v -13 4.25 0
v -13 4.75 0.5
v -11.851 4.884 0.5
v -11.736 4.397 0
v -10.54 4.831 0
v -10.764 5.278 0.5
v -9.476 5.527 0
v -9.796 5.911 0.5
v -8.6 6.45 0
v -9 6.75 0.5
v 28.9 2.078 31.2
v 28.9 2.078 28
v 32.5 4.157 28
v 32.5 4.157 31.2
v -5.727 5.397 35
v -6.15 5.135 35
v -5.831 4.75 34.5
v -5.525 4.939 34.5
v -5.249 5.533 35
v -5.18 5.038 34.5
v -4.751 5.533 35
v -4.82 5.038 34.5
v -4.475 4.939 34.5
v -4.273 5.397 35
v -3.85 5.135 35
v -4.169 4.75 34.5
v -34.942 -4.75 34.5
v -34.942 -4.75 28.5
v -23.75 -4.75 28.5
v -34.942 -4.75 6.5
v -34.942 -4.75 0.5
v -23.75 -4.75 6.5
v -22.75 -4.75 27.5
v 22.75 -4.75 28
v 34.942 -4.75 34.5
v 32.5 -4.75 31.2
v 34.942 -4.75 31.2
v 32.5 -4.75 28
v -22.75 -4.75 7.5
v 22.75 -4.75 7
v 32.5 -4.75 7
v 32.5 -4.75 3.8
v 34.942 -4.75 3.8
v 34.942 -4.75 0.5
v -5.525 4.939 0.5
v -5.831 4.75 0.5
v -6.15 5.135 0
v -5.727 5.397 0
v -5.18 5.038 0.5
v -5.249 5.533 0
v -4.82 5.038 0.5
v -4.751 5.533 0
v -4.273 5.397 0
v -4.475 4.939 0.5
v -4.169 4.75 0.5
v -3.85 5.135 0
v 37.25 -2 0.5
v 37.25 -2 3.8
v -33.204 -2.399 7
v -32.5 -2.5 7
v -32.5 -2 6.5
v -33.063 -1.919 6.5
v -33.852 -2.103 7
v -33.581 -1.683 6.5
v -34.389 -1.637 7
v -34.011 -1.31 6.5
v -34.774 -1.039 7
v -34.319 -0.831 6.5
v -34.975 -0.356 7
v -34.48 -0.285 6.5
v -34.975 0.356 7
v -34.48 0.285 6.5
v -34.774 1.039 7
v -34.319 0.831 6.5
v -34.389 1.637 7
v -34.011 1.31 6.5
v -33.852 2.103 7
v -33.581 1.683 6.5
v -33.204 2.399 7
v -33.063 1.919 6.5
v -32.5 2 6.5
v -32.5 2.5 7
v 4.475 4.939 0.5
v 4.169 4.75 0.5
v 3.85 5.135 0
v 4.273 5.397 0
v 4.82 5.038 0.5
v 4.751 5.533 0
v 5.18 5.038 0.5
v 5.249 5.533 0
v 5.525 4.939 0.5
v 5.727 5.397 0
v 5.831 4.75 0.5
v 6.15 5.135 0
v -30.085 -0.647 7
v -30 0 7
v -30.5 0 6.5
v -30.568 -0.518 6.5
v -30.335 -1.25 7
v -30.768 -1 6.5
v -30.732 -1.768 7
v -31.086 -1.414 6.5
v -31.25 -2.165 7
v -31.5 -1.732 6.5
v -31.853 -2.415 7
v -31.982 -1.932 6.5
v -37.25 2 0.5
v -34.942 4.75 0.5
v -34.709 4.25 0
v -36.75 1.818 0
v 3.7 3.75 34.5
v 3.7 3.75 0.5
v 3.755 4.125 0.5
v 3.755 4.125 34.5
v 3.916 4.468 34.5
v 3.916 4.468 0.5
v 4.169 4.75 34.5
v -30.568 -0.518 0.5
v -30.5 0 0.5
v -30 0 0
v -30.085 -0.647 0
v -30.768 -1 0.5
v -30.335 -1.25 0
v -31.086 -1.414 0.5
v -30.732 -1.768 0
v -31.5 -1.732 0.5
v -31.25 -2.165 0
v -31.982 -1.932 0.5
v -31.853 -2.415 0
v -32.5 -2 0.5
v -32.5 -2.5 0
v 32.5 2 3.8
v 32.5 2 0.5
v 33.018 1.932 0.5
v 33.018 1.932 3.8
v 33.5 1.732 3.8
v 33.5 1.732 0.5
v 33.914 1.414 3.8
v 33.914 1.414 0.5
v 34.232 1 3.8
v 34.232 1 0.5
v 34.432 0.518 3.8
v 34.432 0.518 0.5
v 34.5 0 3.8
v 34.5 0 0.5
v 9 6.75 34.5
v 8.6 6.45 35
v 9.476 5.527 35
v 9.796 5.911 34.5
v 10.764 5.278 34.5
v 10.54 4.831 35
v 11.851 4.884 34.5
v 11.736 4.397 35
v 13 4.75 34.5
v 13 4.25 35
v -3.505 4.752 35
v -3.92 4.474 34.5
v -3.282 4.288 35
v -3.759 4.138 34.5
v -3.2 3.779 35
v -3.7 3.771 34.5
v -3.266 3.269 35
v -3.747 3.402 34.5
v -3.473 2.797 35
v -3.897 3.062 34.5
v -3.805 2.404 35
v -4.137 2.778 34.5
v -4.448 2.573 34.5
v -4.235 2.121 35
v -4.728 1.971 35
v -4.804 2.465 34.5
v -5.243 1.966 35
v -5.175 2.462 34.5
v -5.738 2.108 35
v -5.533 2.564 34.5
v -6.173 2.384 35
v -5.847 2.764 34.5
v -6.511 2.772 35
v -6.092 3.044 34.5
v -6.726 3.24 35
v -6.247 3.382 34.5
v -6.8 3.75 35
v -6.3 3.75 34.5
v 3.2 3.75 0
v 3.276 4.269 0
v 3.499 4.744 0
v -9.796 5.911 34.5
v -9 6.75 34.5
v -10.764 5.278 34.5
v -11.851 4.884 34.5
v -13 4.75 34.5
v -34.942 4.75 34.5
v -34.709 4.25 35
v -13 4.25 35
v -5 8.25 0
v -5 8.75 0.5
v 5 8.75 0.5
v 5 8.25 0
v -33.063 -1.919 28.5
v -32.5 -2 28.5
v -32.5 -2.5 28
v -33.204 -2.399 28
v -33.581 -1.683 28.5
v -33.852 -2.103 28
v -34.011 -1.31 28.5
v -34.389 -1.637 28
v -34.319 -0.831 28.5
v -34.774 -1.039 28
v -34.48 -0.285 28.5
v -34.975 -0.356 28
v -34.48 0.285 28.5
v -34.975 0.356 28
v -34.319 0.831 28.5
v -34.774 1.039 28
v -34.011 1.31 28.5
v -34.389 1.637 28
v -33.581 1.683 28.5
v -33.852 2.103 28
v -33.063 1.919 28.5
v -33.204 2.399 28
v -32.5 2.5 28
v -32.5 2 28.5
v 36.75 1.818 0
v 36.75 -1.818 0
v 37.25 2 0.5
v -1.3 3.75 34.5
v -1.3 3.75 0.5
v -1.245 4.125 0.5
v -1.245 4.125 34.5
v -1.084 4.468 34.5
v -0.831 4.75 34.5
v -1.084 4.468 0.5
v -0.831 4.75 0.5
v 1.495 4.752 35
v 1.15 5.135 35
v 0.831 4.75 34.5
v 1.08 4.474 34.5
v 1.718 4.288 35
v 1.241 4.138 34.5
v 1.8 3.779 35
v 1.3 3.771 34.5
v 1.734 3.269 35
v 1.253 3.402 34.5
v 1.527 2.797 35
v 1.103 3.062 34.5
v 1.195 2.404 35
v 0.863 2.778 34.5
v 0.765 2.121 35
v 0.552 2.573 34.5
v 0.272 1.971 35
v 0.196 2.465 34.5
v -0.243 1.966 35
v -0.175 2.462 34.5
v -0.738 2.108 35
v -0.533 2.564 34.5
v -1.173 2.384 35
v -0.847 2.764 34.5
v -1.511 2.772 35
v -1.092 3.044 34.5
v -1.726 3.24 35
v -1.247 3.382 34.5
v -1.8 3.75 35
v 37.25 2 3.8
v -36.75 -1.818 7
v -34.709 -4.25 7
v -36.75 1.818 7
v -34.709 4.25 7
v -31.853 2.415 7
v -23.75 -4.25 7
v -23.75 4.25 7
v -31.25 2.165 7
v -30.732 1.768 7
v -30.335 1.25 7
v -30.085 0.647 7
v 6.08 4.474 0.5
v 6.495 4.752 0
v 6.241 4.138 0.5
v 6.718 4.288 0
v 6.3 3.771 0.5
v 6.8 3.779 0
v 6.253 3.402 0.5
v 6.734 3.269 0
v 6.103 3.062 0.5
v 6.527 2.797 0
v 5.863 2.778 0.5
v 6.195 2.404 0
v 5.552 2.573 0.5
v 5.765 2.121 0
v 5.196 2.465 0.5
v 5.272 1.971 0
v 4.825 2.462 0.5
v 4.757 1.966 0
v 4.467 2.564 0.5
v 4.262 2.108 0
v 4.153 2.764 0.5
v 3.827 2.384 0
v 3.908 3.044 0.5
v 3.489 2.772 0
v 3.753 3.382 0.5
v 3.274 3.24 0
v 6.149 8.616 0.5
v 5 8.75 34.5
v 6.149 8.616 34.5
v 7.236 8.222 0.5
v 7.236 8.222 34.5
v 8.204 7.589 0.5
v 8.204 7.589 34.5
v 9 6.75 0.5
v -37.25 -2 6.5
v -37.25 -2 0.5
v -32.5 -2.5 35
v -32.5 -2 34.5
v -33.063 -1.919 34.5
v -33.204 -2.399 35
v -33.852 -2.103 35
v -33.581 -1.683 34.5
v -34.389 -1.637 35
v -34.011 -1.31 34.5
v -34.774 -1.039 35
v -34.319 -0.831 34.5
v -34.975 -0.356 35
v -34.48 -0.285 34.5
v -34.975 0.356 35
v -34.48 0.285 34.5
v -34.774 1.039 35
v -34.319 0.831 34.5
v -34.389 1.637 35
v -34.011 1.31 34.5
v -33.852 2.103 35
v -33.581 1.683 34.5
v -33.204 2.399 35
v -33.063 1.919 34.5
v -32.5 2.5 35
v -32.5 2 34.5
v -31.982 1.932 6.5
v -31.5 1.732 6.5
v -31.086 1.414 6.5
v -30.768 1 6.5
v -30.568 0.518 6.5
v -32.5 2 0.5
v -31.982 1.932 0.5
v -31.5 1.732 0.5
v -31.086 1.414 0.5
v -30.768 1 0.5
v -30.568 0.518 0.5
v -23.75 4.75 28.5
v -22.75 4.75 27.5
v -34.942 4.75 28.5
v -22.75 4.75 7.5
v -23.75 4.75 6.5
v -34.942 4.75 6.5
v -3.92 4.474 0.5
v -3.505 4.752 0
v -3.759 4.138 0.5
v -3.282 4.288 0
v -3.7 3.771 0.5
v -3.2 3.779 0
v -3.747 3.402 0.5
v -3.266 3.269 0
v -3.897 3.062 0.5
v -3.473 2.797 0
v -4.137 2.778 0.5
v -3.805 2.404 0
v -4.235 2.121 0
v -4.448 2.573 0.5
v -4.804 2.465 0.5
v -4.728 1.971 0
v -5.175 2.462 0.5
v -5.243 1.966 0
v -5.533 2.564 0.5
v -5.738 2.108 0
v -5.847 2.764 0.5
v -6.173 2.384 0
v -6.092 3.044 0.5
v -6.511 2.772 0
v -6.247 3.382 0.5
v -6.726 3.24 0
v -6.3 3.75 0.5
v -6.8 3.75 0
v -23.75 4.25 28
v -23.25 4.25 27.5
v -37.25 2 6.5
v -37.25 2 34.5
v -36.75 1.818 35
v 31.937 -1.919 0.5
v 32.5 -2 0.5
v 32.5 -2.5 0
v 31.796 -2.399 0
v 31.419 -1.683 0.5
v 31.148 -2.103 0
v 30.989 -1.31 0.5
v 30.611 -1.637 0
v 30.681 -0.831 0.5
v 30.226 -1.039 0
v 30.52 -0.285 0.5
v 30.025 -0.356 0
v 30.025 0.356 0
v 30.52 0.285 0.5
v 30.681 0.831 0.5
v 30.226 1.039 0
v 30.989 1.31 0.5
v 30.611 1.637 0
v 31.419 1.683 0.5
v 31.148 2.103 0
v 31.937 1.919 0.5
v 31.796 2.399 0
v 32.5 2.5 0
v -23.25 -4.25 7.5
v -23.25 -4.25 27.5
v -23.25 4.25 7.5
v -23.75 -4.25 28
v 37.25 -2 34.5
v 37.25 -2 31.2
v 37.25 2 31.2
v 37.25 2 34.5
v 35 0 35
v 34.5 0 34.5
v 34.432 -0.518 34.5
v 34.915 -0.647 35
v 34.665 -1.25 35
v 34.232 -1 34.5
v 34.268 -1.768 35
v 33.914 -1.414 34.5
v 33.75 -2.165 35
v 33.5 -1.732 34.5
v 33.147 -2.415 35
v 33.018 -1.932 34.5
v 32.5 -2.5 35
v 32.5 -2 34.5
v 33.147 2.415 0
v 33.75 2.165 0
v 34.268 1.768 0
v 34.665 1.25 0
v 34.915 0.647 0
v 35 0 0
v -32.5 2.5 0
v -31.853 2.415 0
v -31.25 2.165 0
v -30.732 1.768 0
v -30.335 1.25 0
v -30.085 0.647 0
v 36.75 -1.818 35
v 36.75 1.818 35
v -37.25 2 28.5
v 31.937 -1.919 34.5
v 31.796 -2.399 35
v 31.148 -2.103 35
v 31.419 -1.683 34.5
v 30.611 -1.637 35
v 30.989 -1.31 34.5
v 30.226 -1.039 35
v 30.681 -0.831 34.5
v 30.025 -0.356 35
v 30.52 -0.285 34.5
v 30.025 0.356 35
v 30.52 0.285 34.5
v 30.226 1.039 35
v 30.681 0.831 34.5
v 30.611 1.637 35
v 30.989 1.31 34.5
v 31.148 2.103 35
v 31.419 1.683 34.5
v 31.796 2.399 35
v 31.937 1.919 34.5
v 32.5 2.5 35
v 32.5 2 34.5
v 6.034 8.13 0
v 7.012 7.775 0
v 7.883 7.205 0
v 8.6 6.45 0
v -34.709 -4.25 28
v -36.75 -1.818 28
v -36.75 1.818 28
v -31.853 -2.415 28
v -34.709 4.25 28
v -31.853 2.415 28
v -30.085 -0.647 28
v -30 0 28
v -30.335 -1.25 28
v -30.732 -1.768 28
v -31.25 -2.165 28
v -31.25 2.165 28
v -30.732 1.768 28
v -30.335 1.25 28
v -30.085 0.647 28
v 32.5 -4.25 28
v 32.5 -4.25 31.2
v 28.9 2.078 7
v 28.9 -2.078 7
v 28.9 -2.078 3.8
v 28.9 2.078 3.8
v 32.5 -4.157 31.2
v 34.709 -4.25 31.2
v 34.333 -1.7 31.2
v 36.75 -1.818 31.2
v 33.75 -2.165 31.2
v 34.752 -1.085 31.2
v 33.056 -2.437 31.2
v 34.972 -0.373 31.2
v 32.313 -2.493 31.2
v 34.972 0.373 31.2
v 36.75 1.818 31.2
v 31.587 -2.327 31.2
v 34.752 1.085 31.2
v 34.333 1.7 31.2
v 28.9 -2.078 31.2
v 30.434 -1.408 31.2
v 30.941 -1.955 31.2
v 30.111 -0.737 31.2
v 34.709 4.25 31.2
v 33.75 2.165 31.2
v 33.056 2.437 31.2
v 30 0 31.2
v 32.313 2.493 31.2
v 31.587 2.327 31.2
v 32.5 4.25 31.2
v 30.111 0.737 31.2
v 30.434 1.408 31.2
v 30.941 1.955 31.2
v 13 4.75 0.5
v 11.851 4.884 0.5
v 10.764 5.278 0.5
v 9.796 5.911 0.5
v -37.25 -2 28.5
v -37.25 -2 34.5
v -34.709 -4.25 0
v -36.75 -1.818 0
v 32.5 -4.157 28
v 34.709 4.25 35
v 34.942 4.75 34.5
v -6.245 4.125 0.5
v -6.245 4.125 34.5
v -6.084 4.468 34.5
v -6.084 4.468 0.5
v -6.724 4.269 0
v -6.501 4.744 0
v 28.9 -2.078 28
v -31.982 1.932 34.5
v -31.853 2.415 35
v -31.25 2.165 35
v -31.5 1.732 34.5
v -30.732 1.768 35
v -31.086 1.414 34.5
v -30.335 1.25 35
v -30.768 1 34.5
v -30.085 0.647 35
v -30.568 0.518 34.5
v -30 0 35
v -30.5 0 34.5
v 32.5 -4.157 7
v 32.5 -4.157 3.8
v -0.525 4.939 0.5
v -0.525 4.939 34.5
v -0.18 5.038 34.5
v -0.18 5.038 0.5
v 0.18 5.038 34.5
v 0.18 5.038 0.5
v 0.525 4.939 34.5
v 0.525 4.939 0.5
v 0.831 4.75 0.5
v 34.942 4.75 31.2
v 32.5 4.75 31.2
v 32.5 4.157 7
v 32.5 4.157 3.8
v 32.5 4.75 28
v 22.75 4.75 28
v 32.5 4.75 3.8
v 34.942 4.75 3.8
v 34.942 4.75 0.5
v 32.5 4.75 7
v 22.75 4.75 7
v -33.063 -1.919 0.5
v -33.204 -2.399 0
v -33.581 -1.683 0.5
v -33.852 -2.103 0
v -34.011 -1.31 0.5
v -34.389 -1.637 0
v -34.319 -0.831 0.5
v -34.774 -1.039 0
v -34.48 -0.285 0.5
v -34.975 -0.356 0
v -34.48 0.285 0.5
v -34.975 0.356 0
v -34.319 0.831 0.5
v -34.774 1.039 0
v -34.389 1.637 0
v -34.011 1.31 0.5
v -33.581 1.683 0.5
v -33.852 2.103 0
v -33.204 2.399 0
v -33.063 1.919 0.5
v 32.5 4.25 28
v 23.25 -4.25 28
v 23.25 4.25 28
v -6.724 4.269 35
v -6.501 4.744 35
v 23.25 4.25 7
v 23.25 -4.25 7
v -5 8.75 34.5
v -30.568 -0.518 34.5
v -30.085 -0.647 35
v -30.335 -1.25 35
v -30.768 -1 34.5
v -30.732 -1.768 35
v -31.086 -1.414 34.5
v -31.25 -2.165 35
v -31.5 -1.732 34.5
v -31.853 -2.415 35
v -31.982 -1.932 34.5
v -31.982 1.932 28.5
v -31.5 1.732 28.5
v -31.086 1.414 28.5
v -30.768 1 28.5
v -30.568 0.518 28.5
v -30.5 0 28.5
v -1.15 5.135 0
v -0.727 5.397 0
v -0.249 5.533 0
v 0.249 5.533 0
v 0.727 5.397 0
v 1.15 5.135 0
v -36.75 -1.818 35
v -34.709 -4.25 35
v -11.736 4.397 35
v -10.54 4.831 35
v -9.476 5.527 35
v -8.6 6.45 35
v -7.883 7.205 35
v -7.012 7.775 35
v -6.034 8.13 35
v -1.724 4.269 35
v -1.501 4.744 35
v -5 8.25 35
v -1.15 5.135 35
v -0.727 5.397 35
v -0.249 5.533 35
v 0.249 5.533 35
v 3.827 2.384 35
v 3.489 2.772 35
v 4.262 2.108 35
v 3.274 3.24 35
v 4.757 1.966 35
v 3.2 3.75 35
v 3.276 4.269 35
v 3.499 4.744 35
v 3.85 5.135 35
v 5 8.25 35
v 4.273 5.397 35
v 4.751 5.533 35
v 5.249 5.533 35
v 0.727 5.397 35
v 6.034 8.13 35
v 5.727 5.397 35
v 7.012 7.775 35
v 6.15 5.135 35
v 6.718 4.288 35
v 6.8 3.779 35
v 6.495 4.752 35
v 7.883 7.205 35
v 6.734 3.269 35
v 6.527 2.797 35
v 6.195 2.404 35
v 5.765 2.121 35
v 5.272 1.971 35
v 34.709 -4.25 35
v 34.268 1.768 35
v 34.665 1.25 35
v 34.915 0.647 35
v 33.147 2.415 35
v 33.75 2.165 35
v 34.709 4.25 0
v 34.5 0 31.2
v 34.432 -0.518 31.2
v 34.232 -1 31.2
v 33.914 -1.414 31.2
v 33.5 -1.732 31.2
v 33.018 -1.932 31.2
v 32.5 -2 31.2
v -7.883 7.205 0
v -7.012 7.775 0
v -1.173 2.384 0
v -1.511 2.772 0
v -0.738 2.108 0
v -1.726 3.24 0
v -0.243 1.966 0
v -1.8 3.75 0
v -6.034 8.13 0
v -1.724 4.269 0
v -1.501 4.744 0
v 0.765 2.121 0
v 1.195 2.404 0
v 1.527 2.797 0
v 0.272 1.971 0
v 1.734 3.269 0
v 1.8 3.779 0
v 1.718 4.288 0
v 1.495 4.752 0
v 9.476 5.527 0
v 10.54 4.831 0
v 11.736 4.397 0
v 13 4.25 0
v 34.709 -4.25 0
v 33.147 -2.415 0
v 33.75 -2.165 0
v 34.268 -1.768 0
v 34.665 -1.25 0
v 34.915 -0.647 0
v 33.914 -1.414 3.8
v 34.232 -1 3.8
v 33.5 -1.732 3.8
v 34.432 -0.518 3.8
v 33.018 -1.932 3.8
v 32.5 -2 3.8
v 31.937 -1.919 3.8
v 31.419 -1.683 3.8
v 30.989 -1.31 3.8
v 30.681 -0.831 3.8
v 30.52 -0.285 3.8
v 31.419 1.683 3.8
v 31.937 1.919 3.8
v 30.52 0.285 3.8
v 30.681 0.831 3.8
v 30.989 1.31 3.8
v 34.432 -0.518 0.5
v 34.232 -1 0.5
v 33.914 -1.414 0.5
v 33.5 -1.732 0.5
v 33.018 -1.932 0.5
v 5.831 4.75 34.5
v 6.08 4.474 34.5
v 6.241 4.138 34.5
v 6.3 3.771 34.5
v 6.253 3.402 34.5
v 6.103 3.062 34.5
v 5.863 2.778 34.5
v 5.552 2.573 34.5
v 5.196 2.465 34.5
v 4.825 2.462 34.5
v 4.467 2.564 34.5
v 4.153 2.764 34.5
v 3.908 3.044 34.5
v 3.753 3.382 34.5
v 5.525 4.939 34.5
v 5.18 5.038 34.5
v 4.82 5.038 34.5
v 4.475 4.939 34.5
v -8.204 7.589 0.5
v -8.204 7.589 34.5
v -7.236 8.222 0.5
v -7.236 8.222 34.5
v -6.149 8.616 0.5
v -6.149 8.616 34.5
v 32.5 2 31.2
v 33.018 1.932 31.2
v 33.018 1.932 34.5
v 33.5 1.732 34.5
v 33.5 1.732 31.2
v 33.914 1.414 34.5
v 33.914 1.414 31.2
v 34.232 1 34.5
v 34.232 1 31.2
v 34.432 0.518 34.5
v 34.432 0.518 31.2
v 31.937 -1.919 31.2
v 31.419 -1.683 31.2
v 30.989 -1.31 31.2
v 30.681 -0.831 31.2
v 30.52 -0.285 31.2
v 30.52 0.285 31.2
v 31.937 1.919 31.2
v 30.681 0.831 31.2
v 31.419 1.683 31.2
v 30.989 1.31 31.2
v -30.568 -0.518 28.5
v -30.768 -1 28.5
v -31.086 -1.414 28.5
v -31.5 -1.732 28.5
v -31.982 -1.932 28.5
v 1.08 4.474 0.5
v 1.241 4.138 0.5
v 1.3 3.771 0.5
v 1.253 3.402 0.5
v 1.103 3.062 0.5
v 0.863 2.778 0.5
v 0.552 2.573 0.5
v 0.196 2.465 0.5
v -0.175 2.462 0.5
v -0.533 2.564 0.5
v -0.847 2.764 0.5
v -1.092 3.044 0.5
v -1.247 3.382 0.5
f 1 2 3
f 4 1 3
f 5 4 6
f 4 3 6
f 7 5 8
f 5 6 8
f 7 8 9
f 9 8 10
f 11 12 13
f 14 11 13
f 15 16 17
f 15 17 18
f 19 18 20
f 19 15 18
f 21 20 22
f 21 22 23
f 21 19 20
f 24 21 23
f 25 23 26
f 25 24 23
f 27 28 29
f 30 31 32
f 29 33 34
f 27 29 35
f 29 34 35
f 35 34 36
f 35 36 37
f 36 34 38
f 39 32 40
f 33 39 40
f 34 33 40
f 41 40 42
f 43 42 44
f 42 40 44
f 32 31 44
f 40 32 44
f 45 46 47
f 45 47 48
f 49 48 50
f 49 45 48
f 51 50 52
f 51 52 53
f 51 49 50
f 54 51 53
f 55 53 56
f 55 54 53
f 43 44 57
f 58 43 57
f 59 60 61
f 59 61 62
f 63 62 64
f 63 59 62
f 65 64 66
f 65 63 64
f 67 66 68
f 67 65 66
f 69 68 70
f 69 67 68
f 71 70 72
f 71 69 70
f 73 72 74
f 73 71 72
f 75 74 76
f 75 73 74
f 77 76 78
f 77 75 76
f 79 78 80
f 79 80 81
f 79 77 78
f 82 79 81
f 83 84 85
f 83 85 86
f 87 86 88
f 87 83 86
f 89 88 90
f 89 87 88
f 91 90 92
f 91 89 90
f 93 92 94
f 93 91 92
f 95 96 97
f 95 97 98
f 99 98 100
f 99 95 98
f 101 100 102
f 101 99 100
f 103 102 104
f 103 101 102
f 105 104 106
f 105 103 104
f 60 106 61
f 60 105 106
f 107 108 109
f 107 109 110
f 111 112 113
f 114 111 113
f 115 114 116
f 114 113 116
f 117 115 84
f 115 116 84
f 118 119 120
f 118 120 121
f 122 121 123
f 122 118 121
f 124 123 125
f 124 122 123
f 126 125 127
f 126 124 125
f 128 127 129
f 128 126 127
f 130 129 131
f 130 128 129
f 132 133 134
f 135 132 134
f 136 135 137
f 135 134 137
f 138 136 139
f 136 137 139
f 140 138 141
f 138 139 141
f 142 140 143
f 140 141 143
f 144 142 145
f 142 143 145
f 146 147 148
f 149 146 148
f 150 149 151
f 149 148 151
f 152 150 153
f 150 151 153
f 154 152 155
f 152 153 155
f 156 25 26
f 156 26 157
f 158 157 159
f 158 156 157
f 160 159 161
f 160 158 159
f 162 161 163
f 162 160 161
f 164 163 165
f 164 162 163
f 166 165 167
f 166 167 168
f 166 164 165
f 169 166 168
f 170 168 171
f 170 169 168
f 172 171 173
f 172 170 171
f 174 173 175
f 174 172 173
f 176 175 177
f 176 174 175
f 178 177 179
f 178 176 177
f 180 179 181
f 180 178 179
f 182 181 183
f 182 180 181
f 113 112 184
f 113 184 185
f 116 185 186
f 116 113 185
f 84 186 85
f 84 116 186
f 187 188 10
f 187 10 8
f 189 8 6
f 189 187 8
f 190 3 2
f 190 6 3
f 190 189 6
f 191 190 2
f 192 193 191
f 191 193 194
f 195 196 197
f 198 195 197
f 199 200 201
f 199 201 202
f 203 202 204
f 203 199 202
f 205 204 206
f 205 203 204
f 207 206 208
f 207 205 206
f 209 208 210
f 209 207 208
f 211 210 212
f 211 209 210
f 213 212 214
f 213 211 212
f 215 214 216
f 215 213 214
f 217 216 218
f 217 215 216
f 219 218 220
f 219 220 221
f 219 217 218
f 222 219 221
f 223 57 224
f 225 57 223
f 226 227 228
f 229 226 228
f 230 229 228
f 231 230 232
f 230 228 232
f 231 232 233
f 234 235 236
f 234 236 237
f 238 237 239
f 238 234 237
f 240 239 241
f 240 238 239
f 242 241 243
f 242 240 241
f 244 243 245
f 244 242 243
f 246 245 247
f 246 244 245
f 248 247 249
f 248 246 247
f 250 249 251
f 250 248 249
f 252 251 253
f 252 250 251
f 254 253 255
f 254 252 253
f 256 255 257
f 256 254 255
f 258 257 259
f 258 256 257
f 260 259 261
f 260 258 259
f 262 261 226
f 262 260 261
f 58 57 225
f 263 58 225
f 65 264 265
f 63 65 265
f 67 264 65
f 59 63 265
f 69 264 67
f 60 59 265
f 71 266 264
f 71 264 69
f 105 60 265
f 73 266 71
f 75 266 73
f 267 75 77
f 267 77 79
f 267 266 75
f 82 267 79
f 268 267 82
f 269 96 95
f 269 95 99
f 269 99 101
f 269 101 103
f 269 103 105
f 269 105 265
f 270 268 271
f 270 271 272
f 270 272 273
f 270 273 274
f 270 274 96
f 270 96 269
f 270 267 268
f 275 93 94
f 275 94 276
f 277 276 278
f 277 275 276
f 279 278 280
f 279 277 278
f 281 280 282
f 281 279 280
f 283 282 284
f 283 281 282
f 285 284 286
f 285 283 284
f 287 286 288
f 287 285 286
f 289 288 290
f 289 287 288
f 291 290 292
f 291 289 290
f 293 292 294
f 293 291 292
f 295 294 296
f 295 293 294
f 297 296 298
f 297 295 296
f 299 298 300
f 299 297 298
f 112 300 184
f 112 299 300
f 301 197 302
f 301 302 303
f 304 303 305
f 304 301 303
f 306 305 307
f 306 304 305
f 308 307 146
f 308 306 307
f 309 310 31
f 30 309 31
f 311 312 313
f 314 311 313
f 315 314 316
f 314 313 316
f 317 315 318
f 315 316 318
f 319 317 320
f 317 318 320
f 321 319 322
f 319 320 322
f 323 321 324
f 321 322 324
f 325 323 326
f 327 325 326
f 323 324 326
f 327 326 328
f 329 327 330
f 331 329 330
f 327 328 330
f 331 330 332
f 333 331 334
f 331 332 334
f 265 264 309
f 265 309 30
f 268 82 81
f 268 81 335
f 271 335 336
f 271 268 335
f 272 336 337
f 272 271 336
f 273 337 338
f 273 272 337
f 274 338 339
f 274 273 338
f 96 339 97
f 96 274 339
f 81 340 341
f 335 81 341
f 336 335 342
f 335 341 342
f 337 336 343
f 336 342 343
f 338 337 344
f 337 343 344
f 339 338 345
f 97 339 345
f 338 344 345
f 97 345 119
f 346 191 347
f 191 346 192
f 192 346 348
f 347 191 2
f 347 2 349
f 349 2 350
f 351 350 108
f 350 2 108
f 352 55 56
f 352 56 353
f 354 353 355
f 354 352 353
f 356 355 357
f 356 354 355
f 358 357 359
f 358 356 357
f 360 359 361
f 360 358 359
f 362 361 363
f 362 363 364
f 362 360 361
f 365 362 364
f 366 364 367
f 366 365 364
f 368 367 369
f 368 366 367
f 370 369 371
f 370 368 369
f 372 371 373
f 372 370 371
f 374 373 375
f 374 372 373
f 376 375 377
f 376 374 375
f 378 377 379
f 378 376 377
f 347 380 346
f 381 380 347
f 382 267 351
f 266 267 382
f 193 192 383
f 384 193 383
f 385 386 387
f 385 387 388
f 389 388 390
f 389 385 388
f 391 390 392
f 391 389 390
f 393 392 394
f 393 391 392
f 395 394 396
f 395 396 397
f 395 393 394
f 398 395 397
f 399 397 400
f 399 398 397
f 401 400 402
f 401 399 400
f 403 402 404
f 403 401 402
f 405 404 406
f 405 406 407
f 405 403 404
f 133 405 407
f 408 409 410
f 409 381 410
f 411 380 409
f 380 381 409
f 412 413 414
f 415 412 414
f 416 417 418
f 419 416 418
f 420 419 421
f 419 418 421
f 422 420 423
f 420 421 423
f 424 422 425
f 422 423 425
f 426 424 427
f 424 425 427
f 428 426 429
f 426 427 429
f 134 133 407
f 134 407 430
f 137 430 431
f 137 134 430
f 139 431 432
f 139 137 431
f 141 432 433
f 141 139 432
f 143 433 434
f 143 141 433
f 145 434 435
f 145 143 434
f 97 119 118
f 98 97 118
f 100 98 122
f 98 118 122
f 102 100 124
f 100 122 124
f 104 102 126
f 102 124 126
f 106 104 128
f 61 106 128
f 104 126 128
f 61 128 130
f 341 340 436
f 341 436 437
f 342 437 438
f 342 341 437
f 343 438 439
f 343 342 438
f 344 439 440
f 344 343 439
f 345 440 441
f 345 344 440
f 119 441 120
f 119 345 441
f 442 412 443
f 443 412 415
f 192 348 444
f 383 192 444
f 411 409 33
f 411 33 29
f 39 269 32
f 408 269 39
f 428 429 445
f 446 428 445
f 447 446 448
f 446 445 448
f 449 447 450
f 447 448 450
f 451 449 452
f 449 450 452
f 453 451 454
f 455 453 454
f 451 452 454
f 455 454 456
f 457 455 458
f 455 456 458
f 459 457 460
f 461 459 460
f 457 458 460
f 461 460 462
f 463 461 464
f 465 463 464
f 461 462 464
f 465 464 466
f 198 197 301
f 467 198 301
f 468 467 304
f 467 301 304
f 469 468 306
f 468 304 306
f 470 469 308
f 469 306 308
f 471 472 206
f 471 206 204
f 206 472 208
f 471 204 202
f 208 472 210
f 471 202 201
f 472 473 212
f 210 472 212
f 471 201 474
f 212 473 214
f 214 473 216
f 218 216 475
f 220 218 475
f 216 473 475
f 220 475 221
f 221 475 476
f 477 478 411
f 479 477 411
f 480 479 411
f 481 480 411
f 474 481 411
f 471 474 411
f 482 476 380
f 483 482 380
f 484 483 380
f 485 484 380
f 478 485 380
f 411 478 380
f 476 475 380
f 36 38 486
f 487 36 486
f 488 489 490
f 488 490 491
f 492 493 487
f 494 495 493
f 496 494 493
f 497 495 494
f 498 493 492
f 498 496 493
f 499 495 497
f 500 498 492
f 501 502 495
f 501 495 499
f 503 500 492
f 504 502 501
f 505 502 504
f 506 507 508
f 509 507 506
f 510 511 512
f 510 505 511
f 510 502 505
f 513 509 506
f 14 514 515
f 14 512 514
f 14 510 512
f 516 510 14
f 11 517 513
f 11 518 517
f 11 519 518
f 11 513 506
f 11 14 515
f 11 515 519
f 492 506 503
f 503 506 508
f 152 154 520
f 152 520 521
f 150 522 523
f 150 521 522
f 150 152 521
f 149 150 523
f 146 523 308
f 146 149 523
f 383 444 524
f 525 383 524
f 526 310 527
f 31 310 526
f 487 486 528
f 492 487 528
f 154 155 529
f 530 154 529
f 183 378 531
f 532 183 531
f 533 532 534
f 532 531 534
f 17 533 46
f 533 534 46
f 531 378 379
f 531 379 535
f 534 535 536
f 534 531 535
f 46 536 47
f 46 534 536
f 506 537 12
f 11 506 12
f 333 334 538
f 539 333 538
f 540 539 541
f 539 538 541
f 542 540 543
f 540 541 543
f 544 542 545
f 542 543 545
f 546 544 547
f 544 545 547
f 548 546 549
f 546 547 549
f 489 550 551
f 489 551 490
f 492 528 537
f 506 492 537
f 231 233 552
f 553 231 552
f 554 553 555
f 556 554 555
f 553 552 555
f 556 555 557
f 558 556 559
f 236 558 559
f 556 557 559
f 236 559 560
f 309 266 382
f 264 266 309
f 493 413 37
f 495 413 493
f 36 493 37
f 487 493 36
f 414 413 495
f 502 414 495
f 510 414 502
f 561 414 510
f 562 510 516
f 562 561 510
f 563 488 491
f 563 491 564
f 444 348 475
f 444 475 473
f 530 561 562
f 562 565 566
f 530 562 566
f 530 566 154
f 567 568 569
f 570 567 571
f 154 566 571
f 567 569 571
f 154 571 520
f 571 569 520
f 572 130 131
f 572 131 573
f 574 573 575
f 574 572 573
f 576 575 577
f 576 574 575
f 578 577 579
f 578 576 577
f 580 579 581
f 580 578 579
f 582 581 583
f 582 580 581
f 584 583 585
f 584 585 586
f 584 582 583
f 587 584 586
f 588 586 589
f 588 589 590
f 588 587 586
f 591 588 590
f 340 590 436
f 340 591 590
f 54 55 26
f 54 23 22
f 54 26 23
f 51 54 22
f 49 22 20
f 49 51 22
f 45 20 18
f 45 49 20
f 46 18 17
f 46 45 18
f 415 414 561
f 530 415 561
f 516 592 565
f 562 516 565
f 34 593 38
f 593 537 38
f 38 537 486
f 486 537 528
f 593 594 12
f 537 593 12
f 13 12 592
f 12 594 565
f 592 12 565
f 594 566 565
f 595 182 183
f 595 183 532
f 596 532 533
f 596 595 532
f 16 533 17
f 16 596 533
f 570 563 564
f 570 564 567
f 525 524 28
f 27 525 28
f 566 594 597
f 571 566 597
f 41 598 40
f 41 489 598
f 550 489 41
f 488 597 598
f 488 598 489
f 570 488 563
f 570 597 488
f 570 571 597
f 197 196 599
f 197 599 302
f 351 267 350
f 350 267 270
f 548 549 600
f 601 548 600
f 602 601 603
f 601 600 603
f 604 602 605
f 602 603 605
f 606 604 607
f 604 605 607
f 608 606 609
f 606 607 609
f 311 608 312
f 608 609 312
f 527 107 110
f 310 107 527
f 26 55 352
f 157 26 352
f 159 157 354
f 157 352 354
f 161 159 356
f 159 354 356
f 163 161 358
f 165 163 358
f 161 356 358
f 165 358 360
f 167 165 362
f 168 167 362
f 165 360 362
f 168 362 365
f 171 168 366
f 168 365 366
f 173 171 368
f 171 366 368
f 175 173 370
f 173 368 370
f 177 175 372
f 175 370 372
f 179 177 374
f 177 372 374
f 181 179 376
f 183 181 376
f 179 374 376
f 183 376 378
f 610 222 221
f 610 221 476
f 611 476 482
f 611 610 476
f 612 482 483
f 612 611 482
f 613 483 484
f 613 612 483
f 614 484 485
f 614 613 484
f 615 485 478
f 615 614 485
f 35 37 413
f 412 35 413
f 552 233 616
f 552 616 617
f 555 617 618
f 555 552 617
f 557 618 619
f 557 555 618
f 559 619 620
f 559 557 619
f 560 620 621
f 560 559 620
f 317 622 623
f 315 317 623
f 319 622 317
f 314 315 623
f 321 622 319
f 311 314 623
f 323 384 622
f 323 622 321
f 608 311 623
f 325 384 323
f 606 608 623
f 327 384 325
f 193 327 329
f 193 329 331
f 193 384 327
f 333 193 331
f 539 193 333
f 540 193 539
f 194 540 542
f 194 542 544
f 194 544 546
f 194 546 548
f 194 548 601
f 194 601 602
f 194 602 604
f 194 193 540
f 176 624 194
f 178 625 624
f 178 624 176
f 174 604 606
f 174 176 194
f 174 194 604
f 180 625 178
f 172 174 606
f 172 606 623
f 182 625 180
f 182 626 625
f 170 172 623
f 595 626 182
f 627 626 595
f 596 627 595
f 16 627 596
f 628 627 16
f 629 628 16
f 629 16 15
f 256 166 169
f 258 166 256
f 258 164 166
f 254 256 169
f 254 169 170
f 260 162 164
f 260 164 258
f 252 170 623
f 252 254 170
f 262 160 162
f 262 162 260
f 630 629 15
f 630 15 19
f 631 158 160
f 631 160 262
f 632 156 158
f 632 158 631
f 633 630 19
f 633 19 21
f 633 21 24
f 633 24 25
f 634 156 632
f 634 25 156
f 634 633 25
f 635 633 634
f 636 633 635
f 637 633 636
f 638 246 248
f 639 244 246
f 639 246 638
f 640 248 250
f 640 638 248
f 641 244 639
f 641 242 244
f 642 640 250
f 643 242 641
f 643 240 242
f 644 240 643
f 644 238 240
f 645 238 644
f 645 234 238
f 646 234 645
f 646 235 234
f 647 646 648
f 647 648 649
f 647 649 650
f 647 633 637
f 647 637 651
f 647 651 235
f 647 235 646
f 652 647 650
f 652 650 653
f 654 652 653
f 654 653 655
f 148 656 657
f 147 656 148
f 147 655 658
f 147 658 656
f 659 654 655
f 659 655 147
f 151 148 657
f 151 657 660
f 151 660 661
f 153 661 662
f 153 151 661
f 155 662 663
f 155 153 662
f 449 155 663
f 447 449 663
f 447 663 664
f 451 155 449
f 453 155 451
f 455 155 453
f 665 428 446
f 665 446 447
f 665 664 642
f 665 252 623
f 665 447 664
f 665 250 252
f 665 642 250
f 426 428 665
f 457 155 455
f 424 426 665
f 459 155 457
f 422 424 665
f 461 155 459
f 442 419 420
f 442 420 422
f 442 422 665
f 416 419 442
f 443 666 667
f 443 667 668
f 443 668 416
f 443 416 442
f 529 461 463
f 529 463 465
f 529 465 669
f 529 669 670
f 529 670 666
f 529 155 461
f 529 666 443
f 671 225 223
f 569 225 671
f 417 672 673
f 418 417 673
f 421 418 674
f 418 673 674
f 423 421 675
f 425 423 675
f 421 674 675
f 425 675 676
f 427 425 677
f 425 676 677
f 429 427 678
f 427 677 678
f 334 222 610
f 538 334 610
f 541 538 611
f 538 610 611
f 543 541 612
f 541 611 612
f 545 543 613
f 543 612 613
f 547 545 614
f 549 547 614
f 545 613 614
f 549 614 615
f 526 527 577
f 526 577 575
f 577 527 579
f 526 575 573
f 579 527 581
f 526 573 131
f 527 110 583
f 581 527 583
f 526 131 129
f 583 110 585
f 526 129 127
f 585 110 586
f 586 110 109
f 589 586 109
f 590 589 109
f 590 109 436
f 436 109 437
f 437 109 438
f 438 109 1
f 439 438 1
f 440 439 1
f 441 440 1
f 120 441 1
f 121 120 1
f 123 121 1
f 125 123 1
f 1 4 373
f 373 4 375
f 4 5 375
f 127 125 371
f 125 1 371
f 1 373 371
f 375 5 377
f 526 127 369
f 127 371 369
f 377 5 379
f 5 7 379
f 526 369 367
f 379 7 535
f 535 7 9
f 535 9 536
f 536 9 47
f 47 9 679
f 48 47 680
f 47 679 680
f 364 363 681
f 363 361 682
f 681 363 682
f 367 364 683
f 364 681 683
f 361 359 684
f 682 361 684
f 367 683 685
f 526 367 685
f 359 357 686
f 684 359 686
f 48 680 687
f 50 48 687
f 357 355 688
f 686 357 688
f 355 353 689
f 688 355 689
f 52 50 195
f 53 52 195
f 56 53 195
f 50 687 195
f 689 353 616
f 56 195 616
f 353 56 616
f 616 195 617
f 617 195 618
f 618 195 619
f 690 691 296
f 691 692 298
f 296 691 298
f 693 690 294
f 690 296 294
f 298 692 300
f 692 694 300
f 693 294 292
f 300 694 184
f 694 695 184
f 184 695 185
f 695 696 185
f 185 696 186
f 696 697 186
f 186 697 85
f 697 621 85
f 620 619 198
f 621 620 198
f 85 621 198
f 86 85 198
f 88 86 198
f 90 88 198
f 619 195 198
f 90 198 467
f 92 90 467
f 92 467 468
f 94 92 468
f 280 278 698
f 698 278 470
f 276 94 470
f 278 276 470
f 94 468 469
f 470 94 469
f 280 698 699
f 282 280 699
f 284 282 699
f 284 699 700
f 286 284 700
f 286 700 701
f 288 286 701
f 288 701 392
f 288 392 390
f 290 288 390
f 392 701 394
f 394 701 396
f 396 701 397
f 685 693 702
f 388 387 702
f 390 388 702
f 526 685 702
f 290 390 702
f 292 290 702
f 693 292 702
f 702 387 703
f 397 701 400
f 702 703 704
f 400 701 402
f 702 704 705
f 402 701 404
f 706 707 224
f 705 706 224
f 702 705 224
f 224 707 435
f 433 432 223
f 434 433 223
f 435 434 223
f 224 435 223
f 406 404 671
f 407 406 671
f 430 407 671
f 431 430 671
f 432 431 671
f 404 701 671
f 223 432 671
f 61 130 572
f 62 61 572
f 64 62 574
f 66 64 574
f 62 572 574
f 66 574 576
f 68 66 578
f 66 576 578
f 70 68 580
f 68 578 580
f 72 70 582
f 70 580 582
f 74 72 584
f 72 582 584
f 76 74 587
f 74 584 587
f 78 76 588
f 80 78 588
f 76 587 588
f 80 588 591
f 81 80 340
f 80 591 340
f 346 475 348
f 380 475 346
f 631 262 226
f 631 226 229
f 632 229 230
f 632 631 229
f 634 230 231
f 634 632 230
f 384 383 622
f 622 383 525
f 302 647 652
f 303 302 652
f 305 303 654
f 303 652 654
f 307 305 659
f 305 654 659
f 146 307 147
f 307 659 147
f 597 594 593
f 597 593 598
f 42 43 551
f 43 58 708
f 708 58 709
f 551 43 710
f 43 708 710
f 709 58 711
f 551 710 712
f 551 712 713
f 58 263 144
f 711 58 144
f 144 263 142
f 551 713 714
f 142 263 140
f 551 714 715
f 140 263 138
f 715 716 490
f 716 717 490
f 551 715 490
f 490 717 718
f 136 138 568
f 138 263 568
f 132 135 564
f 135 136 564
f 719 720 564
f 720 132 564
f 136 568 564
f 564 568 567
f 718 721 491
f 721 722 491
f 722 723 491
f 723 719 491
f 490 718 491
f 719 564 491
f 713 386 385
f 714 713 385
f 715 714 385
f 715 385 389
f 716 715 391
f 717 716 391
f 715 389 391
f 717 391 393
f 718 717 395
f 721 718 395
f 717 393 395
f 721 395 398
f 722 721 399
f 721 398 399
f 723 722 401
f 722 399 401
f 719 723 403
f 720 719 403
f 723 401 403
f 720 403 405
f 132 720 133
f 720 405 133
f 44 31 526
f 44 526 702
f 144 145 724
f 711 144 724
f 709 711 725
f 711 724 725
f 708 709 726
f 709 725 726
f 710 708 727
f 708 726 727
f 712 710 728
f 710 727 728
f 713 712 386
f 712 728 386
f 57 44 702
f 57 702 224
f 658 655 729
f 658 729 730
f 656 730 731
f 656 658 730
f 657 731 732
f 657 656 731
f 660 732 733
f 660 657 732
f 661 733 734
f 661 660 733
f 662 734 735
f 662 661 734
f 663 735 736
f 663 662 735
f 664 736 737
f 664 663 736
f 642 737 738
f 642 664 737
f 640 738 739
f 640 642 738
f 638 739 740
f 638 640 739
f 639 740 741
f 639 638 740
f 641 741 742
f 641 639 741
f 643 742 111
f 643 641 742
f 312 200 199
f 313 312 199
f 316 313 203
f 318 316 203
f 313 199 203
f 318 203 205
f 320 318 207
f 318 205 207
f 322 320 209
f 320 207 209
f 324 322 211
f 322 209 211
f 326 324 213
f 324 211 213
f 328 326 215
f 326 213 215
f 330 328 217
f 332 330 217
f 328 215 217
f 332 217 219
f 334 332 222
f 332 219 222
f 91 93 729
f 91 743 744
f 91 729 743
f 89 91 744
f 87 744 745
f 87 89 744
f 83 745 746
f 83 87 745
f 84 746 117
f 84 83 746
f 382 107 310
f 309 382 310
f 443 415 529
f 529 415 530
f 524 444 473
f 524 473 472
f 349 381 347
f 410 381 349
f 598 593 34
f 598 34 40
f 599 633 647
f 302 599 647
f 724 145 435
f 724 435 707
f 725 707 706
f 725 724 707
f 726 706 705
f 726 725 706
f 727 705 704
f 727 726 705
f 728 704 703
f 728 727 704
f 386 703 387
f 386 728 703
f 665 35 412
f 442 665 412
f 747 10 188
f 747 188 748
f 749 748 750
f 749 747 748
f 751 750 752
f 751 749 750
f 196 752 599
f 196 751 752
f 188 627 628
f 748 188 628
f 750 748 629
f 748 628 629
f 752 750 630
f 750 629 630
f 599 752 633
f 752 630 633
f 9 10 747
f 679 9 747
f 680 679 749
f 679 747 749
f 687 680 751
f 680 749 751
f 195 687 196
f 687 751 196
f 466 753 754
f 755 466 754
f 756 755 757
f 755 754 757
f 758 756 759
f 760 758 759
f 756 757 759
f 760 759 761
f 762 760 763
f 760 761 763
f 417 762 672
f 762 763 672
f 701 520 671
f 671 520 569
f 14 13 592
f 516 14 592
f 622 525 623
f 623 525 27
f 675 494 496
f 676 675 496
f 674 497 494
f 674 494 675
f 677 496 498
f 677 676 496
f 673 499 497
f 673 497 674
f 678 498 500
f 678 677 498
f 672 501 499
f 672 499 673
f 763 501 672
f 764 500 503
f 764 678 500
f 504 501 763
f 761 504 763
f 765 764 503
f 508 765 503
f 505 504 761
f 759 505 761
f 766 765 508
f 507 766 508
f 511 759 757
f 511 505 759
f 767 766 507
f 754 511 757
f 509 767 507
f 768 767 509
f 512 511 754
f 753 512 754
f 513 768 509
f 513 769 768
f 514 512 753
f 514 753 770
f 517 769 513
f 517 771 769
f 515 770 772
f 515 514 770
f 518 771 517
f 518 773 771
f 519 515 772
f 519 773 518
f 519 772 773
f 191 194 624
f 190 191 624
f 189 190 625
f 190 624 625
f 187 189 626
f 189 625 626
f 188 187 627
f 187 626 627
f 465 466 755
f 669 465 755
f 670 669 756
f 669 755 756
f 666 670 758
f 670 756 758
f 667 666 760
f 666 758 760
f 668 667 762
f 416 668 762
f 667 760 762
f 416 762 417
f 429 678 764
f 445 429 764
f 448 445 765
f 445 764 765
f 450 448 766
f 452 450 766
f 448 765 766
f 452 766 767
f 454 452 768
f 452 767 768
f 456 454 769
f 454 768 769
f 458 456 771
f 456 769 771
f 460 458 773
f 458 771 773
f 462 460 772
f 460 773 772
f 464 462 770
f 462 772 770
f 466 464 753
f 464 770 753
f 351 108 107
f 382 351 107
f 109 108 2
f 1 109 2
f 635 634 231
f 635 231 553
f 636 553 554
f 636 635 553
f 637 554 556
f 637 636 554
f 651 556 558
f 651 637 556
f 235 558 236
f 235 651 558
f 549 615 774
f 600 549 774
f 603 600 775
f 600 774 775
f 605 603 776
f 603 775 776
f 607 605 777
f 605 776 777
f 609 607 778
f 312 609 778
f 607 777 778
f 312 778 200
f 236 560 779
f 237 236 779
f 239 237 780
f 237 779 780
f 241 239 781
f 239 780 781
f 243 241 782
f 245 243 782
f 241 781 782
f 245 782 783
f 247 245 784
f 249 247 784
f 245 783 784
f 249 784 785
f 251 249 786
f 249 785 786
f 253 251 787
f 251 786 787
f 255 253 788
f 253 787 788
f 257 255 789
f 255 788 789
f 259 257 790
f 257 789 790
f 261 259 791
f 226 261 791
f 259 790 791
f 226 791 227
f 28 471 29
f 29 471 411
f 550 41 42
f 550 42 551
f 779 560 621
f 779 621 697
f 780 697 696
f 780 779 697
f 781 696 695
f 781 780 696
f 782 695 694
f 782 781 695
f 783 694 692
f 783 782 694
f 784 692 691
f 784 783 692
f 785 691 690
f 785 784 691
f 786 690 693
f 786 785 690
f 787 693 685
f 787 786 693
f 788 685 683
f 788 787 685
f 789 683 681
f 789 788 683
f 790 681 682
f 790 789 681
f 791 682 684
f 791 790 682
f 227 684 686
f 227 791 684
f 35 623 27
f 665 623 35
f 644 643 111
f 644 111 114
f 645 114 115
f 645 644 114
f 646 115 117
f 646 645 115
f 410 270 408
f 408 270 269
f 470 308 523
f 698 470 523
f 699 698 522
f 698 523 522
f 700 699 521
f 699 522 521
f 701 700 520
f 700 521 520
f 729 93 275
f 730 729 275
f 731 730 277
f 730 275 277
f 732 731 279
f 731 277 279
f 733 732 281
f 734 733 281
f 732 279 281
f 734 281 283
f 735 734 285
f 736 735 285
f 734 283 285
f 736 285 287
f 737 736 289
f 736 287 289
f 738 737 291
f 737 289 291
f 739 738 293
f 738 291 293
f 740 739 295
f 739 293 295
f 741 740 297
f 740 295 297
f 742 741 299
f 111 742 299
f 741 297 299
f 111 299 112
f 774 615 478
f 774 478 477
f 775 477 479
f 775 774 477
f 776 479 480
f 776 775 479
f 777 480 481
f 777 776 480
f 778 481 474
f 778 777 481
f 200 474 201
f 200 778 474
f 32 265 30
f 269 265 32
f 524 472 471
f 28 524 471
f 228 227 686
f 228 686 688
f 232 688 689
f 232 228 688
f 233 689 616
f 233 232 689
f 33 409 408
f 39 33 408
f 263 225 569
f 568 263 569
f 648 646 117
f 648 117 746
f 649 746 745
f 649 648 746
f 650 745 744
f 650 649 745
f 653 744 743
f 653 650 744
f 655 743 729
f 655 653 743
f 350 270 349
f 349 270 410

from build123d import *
from build123d.topology import SkipClean

# Parameters (mm, degrees)
BOSS_EXTRUDE1_DEPTH = 35
SKETCH2_W           = 14
SKETCH2_H           = 21
CUT_EXTRUDE1_DEPTH  = 35
BOSS_EXTRUDE2_DEPTH = 35
CUT_EXTRUDE2_DEPTH  = 58
FILLET1_R           = 5
CHAMFER2_SIZE       = 0.5
CHAMFER3_SIZE       = 0.5
CUT_EXTRUDE3_START  = -7
CUT_EXTRUDE3_DEPTH  = 3.2
CUT_EXTRUDE4_START  = -28
SKETCH4_3_R         = 2.5
CUT_EXTRUDE4_DEPTH  = 3.2


with BuildPart() as part:
    # Sketch1 → Boss-Extrude1 (new body)
    with BuildSketch(Plane.XY):
        with BuildLine():
            ThreePointArc((32.5, -4.75), (27.75, 0), (32.5, 4.75))
            Line((32.5, 4.75), (-32.5, 4.75))
            ThreePointArc((-32.5, 4.75), (-29.141242789, 3.358757211), (-27.75, 0))
            ThreePointArc((-27.75, 0), (-29.141242789, -3.358757211), (-32.5, -4.75))
            Line((-32.5, -4.75), (32.5, -4.75))
        make_face()
        with BuildLine():
            ThreePointArc((-27.75, 0), (-29.141242789, 3.358757211), (-32.5, 4.75))
            Line((-32.5, 4.75), (-32.5, 2))
            ThreePointArc((-32.5, 2), (-31.085786438, 1.414213562), (-30.5, 0))
            ThreePointArc((-30.5, 0), (-31.085786438, -1.414213562), (-32.5, -2))
            Line((-32.5, -2), (-32.5, -4.75))
            ThreePointArc((-32.5, -4.75), (-29.141242789, -3.358757211), (-27.75, 0))
        make_face()
        with BuildLine():
            Line((-32.5, 2), (-32.5, 4.75))
            ThreePointArc((-32.5, 4.75), (-35.858757211, 3.358757211), (-37.25, 0))
            ThreePointArc((-37.25, 0), (-35.858757211, -3.358757211), (-32.5, -4.75))
            Line((-32.5, -4.75), (-32.5, -2))
            ThreePointArc((-32.5, -2), (-34.5, 0), (-32.5, 2))
        make_face()
        with BuildLine():
            ThreePointArc((32.5, -4.75), (35.858757211, -3.358757211), (37.25, 0))
            ThreePointArc((37.25, 0), (35.858757211, 3.358757211), (32.5, 4.75))
            Line((32.5, 4.75), (32.5, 2))
            ThreePointArc((32.5, 2), (33.914213562, 1.414213562), (34.5, 0))
            ThreePointArc((34.5, 0), (33.914213562, -1.414213562), (32.5, -2))
            Line((32.5, -2), (32.5, -4.75))
        make_face()
        with BuildLine():
            Line((32.5, 2), (32.5, 4.75))
            ThreePointArc((32.5, 4.75), (27.75, 0), (32.5, -4.75))
            Line((32.5, -4.75), (32.5, -2))
            ThreePointArc((32.5, -2), (30.5, 0), (32.5, 2))
        make_face()
        with BuildLine():
            ThreePointArc((-37.25, 0), (-35.858757211, 3.358757211), (-32.5, 4.75))
            Line((-32.5, 4.75), (-34.942476014, 4.75))
            Line((-34.942476014, 4.75), (-37.25, 2))
            Line((-37.25, 2), (-37.25, 0))
        make_face()
        with BuildLine():
            Line((-34.942476014, -4.75), (-32.5, -4.75))
            ThreePointArc((-32.5, -4.75), (-35.858757211, -3.358757211), (-37.25, 0))
            Line((-37.25, 0), (-37.25, -2))
            Line((-37.25, -2), (-34.942476014, -4.75))
        make_face()
        with BuildLine():
            Line((37.25, 0), (37.25, 2))
            Line((37.25, 2), (34.942476014, 4.75))
            Line((34.942476014, 4.75), (32.5, 4.75))
            ThreePointArc((32.5, 4.75), (35.858757211, 3.358757211), (37.25, 0))
        make_face()
        with BuildLine():
            Line((37.25, -2), (37.25, 0))
            ThreePointArc((37.25, 0), (35.858757211, -3.358757211), (32.5, -4.75))
            Line((32.5, -4.75), (34.942476014, -4.75))
            Line((34.942476014, -4.75), (37.25, -2))
        make_face()
    extrude(amount=BOSS_EXTRUDE1_DEPTH)

    # Sketch2 → Cut-Extrude1 (cut)
    with BuildSketch(Plane(origin=(0, 4.75, 0), x_dir=(1, 0, 0), z_dir=(0, 1, 0))):
        with Locations((30.25, -17.5)):
            Rectangle(SKETCH2_W, SKETCH2_H)
        with Locations((-30.25, -17.5)):
            Rectangle(SKETCH2_W, SKETCH2_H)
    extrude(amount=-CUT_EXTRUDE1_DEPTH, mode=Mode.SUBTRACT)

    # Sketch3 → Boss-Extrude2 (add)
    with BuildSketch(Plane(origin=(0, 0, 0), x_dir=(-1, 0, 0), z_dir=(0, 0, -1))):
        with BuildLine():
            ThreePointArc((-5, 8.75), (-8.16227766, 7.622983346), (-9.898979486, 4.75))
            Line((-9.898979486, 4.75), (-5.830662386, 4.75))
            ThreePointArc((-5.830662386, 4.75), (-5, 5.05), (-4.169337614, 4.75))
            Line((-4.169337614, 4.75), (4.169337614, 4.75))
            ThreePointArc((4.169337614, 4.75), (5, 5.05), (5.830662386, 4.75))
            Line((5.830662386, 4.75), (9.898979486, 4.75))
            ThreePointArc((9.898979486, 4.75), (8.16227766, 7.622983346), (5, 8.75))
            Line((5, 8.75), (-5, 8.75))
        make_face()
    extrude(amount=-BOSS_EXTRUDE2_DEPTH)

    # Sketch3<2> → Cut-Extrude2 (cut)
    with SkipClean():  # the faces are left unmerged after this step: merging them gives an invalid solid
        with BuildSketch(Plane(origin=(0, 0, 0), x_dir=(-1, 0, 0), z_dir=(0, 0, -1))):
            with BuildLine():
                Line((0.830662386, 4.75), (-0.830662386, 4.75))
                ThreePointArc((-0.830662386, 4.75), (-0.552330923, 2.573169277), (1.3, 3.75))
                ThreePointArc((1.3, 3.75), (1.176830723, 4.302330923), (0.830662386, 4.75))
            make_face()
            with BuildLine():
                ThreePointArc((0.830662386, 4.75), (0, 5.05), (-0.830662386, 4.75))
                Line((-0.830662386, 4.75), (0.830662386, 4.75))
            make_face()
            with BuildLine():
                Line((-4.169337614, 4.75), (-5.830662386, 4.75))
                ThreePointArc((-5.830662386, 4.75), (-5.552330923, 2.573169277), (-3.7, 3.75))
                ThreePointArc((-3.7, 3.75), (-3.823169277, 4.302330923), (-4.169337614, 4.75))
            make_face()
            with BuildLine():
                ThreePointArc((-4.169337614, 4.75), (-5, 5.05), (-5.830662386, 4.75))
                Line((-5.830662386, 4.75), (-4.169337614, 4.75))
            make_face()
            with BuildLine():
                Line((4.169337614, 4.75), (5.830662386, 4.75))
                ThreePointArc((5.830662386, 4.75), (5, 5.05), (4.169337614, 4.75))
            make_face()
            with BuildLine():
                ThreePointArc((6.3, 3.75), (6.176830723, 4.302330923), (5.830662386, 4.75))
                Line((5.830662386, 4.75), (4.169337614, 4.75))
                ThreePointArc((4.169337614, 4.75), (4.447669077, 2.573169277), (6.3, 3.75))
            make_face()
        extrude(amount=-CUT_EXTRUDE2_DEPTH, mode=Mode.SUBTRACT)

    # Fillet1
    fillet1_edges = [part.edges().sort_by_distance(p)[0] for p in [
        (-9.898979486, 4.75, 17.5),
        (9.898979486, 4.75, 17.5),
    ]]
    fillet(fillet1_edges, radius=FILLET1_R)

    # Chamfer2
    chamfer2_edges = [part.edges().sort_by_distance(p)[0] for p in [
        (-6.176830723, 4.302330923, 0),
        (3.823169277, 4.302330923, 0),
        (7.236067977, 8.222135955, 35),
        (0, 8.75, 0),
        (7.236067977, 8.222135955, 0),
        (-4.447669077, 2.573169277, 35),
        (5.552330923, 2.573169277, 35),
        (0, 8.75, 35),
        (-23.971238007, 4.75, 35),
        (-32.5, -2, 0),
        (36.096238007, 3.375, 0),
        (37.25, 0, 0),
        (1.3, 3.75, 35),
        (1.3, 3.75, 0),
        (36.096238007, -3.375, 0),
        (0, -4.75, 0),
        (23.971238007, 4.75, 35),
        (23.971238007, 4.75, 0),
        (-7.236067977, 8.222135955, 35),
        (-7.236067977, 8.222135955, 0),
        (10.763932023, 5.277864045, 0),
        (10.763932023, 5.277864045, 35),
        (-10.763932023, 5.277864045, 0),
        (-10.763932023, 5.277864045, 35),
        (-36.096238007, -3.375, 0),
        (-37.25, 0, 0),
        (-36.096238007, 3.375, 0),
        (-23.971238007, 4.75, 0),
        (32.5, -2, 0),
        (-36.096238007, 3.375, 35),
        (-37.25, 0, 35),
        (-36.096238007, -3.375, 35),
        (0, -4.75, 35),
        (-23.25, -4.75, 17.5),
        (36.096238007, -3.375, 35),
        (37.25, 0, 35),
        (36.096238007, 3.375, 35),
        (-32.5, -2, 35),
        (32.5, -2, 35),
        (-37.25, 0, 28),
        (-23.25, 0, 7),
        (-36.096238007, 3.375, 7),
        (-29.096238007, -4.75, 7),
        (-36.096238007, -3.375, 7),
        (-37.25, 0, 7),
        (-32.5, -2, 7),
        (-36.096238007, 3.375, 28),
        (-36.096238007, -3.375, 28),
        (-29.096238007, -4.75, 28),
        (-23.25, 0, 28),
        (-32.5, -2, 28),
        (-29.096238007, 4.75, 7),
        (-29.096238007, 4.75, 28),
        (-23.25, 4.75, 17.5),
    ]]
    chamfer(chamfer2_edges, length=CHAMFER2_SIZE)

    # Chamfer3
    chamfer3_edges = [part.edges().sort_by_distance(p)[0] for p in [
        (23.25, -4.75, 17.5),
        (23.25, 4.75, 17.5),
    ]]
    chamfer(chamfer3_edges, length=CHAMFER3_SIZE)

    # Sketch4 → Cut-Extrude3 (cut)
    with SkipClean():  # the faces are left unmerged after this step: merging them gives an invalid solid
        with BuildSketch(Plane(origin=(0, 0, 0), x_dir=(-1, 0, 0), z_dir=(0, 0, -1)).offset(CUT_EXTRUDE3_START)):
            Polygon((-28.9, -2.078460969), (-28.9, 2.078460969), (-32.5, 4.156921938), (-32.5, 4.75), (-41.441027027, 4.75), (-41.441027027, -4.75), (-32.5, -4.75), (-32.5, -4.156921938), align=None)
        extrude(amount=CUT_EXTRUDE3_DEPTH, mode=Mode.SUBTRACT)

    # Sketch4<3> → Cut-Extrude4 (cut)
    # profile 1 of 3: a face of its own
    with SkipClean():  # the faces are left unmerged after this step: merging them gives an invalid solid
        with BuildSketch(Plane(origin=(0, 0, 0), x_dir=(-1, 0, 0), z_dir=(0, 0, -1)).offset(CUT_EXTRUDE4_START)):
            Polygon((-28.9, -2.078460969), (-28.9, 2.078460969), (-32.5, 4.156921938), (-32.5, 4.25), (-34.709322185, 4.25), (-36.75, 1.818014883), (-36.75, -1.818014883), (-34.709322185, -4.25), (-32.5, -4.25), (-32.5, -4.156921938), align=None)
            with Locations((-32.5, 0)):
                Circle(SKETCH4_3_R, mode=Mode.SUBTRACT)
        # profile 2 of 3: a face of its own
        with BuildSketch(Plane(origin=(0, 0, 0), x_dir=(-1, 0, 0), z_dir=(0, 0, -1)).offset(CUT_EXTRUDE4_START)):
            with Locations((-32.5, 0)):
                Circle(SKETCH4_3_R)
        # profile 3 of 3: a face of its own
        with BuildSketch(Plane(origin=(0, 0, 0), x_dir=(-1, 0, 0), z_dir=(0, 0, -1)).offset(CUT_EXTRUDE4_START)):
            Polygon((-34.709322185, 4.25), (-32.5, 4.25), (-32.5, 4.75), (-41.441027027, 4.75), (-41.441027027, -4.75), (-32.5, -4.75), (-32.5, -4.25), (-34.709322185, -4.25), (-36.75, -1.818014883), (-36.75, 1.818014883), align=None)
        extrude(amount=-CUT_EXTRUDE4_DEPTH, mode=Mode.SUBTRACT)


solid = part.part
